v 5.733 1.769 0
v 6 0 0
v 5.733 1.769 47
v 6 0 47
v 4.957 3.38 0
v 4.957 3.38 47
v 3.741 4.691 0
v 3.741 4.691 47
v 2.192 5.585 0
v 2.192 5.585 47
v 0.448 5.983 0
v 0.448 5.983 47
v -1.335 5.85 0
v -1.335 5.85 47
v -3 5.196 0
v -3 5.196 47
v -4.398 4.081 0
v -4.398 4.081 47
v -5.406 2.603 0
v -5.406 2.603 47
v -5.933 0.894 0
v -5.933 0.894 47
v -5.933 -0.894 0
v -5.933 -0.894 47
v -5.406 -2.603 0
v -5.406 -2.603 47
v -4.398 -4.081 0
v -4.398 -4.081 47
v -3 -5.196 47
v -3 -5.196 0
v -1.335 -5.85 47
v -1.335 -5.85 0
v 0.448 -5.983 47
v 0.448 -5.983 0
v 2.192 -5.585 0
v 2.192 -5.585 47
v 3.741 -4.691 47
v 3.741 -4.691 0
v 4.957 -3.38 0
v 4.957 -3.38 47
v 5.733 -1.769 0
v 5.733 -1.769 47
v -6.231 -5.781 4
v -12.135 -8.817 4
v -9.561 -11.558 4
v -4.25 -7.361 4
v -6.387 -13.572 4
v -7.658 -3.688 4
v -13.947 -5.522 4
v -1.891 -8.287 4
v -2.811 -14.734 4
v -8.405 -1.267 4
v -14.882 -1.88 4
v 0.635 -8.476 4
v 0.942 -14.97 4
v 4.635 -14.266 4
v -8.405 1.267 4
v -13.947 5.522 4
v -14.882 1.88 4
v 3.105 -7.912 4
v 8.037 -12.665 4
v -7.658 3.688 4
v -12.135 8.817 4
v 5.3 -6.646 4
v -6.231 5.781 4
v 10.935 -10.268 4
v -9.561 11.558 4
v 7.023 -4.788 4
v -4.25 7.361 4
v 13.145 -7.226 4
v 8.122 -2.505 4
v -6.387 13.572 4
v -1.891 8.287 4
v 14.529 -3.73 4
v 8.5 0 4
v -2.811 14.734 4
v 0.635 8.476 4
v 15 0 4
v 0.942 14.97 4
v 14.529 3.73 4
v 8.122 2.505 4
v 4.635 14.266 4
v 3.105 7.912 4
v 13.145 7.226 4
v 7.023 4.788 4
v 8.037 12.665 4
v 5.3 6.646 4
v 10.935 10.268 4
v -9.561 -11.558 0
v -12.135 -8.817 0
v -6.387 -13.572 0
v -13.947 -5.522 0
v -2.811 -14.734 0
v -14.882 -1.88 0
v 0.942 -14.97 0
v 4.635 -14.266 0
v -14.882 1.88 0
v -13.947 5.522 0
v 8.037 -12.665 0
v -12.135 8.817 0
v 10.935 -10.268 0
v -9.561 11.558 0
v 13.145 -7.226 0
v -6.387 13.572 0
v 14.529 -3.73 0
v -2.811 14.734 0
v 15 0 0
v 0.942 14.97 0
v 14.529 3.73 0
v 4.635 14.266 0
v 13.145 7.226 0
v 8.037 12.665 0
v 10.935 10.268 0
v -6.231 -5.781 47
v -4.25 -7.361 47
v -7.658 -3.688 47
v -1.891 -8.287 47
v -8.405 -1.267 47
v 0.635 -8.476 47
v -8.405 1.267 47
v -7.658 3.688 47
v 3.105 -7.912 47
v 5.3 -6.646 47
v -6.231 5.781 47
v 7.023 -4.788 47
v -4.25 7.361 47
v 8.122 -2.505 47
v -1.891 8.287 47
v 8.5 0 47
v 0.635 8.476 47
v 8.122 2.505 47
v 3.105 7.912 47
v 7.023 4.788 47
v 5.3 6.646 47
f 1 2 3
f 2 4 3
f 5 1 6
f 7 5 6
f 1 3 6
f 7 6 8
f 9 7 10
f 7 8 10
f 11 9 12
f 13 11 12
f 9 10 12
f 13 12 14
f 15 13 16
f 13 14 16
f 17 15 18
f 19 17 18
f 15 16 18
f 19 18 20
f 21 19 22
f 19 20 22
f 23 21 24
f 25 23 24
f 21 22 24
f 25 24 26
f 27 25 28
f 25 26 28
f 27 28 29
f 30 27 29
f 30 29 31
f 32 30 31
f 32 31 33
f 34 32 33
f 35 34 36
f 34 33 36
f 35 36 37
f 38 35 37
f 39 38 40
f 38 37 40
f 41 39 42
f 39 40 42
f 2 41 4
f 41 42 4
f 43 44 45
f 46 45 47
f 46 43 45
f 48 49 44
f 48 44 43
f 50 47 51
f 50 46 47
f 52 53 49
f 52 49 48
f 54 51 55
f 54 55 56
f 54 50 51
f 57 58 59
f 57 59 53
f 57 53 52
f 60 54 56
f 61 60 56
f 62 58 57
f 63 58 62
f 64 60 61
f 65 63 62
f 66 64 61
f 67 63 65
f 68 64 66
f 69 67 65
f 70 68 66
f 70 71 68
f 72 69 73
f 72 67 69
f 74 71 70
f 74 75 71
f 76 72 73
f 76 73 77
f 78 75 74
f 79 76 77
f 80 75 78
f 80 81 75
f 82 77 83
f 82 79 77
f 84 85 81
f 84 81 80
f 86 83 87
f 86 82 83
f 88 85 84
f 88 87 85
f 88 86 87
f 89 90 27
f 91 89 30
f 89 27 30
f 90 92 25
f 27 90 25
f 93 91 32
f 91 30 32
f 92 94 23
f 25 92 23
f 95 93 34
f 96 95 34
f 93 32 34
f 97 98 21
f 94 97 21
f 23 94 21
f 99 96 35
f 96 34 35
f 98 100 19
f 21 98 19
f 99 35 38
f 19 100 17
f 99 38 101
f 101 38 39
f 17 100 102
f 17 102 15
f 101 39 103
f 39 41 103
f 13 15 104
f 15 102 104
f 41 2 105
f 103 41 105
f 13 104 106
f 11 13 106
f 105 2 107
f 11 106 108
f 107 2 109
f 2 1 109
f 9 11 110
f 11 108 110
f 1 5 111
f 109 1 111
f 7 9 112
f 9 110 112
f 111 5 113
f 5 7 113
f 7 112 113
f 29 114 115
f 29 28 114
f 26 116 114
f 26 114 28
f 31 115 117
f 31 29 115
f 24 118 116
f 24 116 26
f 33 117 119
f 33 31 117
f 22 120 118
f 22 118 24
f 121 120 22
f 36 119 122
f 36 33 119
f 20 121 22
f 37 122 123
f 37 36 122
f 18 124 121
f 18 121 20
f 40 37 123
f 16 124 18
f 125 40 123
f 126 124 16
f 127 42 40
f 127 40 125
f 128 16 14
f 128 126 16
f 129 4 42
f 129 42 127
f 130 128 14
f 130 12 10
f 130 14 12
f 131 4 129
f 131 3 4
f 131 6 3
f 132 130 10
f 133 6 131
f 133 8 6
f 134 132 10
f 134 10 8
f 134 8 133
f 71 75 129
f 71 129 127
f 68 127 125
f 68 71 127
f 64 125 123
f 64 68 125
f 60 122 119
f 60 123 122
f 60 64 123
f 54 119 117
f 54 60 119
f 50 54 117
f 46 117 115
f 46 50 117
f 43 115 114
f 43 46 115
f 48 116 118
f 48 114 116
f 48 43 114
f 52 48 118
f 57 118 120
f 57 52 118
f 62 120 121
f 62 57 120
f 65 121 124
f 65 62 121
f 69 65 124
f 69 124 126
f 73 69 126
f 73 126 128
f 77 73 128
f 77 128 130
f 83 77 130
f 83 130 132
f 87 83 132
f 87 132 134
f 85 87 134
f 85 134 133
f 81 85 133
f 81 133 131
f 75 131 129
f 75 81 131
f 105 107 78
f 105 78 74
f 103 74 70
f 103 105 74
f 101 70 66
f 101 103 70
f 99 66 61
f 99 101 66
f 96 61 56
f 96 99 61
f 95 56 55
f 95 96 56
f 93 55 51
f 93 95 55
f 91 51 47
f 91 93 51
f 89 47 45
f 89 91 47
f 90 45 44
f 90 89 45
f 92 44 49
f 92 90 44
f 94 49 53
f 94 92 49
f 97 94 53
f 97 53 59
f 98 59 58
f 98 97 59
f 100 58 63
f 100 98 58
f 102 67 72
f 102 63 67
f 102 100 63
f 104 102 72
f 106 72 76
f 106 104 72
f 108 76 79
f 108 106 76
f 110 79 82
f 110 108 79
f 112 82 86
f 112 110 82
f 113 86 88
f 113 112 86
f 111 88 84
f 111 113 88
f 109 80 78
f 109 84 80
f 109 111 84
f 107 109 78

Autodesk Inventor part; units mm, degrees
ref_plane "YZ Plane" through (0, 0, 0) normal (1, 0, 0) x (0, 1, 0)
ref_plane "XZ Plane" through (0, 0, 0) normal (0, 1, 0) x (-1, 0, 0)
ref_plane "XY Plane" through (0, 0, 0) normal (0, 0, 1) x (1, 0, 0)
sketch "Boceto1" plane through (0, 0, 0) normal (0, 0, 1) x (1, 0, 0)
  circle A0 centre (0, 0) radius 15
  dimension "d0" = 30
extrude "Extrusión1" add sketch "Boceto1" along normal blind 4
sketch "Boceto2" plane through (0, 0, 4) normal (0, 0, 1) x (1, 0, 0)
  circle A0 centre (0, 0) radius 8.5
  dimension "d3" = 17
extrude "Extrusión2" add sketch "Boceto2" along normal blind 43
sketch "Boceto3" plane through (0, 0, 47) normal (0, 0, 1) x (1, 0, 0)
  circle A0 centre (0, 0) radius 6
  dimension "d6" = 12
extrude "Extrusión3" cut sketch "Boceto3" against normal through all
properties part number "wheel_bush" material "Acero inoxidable"
